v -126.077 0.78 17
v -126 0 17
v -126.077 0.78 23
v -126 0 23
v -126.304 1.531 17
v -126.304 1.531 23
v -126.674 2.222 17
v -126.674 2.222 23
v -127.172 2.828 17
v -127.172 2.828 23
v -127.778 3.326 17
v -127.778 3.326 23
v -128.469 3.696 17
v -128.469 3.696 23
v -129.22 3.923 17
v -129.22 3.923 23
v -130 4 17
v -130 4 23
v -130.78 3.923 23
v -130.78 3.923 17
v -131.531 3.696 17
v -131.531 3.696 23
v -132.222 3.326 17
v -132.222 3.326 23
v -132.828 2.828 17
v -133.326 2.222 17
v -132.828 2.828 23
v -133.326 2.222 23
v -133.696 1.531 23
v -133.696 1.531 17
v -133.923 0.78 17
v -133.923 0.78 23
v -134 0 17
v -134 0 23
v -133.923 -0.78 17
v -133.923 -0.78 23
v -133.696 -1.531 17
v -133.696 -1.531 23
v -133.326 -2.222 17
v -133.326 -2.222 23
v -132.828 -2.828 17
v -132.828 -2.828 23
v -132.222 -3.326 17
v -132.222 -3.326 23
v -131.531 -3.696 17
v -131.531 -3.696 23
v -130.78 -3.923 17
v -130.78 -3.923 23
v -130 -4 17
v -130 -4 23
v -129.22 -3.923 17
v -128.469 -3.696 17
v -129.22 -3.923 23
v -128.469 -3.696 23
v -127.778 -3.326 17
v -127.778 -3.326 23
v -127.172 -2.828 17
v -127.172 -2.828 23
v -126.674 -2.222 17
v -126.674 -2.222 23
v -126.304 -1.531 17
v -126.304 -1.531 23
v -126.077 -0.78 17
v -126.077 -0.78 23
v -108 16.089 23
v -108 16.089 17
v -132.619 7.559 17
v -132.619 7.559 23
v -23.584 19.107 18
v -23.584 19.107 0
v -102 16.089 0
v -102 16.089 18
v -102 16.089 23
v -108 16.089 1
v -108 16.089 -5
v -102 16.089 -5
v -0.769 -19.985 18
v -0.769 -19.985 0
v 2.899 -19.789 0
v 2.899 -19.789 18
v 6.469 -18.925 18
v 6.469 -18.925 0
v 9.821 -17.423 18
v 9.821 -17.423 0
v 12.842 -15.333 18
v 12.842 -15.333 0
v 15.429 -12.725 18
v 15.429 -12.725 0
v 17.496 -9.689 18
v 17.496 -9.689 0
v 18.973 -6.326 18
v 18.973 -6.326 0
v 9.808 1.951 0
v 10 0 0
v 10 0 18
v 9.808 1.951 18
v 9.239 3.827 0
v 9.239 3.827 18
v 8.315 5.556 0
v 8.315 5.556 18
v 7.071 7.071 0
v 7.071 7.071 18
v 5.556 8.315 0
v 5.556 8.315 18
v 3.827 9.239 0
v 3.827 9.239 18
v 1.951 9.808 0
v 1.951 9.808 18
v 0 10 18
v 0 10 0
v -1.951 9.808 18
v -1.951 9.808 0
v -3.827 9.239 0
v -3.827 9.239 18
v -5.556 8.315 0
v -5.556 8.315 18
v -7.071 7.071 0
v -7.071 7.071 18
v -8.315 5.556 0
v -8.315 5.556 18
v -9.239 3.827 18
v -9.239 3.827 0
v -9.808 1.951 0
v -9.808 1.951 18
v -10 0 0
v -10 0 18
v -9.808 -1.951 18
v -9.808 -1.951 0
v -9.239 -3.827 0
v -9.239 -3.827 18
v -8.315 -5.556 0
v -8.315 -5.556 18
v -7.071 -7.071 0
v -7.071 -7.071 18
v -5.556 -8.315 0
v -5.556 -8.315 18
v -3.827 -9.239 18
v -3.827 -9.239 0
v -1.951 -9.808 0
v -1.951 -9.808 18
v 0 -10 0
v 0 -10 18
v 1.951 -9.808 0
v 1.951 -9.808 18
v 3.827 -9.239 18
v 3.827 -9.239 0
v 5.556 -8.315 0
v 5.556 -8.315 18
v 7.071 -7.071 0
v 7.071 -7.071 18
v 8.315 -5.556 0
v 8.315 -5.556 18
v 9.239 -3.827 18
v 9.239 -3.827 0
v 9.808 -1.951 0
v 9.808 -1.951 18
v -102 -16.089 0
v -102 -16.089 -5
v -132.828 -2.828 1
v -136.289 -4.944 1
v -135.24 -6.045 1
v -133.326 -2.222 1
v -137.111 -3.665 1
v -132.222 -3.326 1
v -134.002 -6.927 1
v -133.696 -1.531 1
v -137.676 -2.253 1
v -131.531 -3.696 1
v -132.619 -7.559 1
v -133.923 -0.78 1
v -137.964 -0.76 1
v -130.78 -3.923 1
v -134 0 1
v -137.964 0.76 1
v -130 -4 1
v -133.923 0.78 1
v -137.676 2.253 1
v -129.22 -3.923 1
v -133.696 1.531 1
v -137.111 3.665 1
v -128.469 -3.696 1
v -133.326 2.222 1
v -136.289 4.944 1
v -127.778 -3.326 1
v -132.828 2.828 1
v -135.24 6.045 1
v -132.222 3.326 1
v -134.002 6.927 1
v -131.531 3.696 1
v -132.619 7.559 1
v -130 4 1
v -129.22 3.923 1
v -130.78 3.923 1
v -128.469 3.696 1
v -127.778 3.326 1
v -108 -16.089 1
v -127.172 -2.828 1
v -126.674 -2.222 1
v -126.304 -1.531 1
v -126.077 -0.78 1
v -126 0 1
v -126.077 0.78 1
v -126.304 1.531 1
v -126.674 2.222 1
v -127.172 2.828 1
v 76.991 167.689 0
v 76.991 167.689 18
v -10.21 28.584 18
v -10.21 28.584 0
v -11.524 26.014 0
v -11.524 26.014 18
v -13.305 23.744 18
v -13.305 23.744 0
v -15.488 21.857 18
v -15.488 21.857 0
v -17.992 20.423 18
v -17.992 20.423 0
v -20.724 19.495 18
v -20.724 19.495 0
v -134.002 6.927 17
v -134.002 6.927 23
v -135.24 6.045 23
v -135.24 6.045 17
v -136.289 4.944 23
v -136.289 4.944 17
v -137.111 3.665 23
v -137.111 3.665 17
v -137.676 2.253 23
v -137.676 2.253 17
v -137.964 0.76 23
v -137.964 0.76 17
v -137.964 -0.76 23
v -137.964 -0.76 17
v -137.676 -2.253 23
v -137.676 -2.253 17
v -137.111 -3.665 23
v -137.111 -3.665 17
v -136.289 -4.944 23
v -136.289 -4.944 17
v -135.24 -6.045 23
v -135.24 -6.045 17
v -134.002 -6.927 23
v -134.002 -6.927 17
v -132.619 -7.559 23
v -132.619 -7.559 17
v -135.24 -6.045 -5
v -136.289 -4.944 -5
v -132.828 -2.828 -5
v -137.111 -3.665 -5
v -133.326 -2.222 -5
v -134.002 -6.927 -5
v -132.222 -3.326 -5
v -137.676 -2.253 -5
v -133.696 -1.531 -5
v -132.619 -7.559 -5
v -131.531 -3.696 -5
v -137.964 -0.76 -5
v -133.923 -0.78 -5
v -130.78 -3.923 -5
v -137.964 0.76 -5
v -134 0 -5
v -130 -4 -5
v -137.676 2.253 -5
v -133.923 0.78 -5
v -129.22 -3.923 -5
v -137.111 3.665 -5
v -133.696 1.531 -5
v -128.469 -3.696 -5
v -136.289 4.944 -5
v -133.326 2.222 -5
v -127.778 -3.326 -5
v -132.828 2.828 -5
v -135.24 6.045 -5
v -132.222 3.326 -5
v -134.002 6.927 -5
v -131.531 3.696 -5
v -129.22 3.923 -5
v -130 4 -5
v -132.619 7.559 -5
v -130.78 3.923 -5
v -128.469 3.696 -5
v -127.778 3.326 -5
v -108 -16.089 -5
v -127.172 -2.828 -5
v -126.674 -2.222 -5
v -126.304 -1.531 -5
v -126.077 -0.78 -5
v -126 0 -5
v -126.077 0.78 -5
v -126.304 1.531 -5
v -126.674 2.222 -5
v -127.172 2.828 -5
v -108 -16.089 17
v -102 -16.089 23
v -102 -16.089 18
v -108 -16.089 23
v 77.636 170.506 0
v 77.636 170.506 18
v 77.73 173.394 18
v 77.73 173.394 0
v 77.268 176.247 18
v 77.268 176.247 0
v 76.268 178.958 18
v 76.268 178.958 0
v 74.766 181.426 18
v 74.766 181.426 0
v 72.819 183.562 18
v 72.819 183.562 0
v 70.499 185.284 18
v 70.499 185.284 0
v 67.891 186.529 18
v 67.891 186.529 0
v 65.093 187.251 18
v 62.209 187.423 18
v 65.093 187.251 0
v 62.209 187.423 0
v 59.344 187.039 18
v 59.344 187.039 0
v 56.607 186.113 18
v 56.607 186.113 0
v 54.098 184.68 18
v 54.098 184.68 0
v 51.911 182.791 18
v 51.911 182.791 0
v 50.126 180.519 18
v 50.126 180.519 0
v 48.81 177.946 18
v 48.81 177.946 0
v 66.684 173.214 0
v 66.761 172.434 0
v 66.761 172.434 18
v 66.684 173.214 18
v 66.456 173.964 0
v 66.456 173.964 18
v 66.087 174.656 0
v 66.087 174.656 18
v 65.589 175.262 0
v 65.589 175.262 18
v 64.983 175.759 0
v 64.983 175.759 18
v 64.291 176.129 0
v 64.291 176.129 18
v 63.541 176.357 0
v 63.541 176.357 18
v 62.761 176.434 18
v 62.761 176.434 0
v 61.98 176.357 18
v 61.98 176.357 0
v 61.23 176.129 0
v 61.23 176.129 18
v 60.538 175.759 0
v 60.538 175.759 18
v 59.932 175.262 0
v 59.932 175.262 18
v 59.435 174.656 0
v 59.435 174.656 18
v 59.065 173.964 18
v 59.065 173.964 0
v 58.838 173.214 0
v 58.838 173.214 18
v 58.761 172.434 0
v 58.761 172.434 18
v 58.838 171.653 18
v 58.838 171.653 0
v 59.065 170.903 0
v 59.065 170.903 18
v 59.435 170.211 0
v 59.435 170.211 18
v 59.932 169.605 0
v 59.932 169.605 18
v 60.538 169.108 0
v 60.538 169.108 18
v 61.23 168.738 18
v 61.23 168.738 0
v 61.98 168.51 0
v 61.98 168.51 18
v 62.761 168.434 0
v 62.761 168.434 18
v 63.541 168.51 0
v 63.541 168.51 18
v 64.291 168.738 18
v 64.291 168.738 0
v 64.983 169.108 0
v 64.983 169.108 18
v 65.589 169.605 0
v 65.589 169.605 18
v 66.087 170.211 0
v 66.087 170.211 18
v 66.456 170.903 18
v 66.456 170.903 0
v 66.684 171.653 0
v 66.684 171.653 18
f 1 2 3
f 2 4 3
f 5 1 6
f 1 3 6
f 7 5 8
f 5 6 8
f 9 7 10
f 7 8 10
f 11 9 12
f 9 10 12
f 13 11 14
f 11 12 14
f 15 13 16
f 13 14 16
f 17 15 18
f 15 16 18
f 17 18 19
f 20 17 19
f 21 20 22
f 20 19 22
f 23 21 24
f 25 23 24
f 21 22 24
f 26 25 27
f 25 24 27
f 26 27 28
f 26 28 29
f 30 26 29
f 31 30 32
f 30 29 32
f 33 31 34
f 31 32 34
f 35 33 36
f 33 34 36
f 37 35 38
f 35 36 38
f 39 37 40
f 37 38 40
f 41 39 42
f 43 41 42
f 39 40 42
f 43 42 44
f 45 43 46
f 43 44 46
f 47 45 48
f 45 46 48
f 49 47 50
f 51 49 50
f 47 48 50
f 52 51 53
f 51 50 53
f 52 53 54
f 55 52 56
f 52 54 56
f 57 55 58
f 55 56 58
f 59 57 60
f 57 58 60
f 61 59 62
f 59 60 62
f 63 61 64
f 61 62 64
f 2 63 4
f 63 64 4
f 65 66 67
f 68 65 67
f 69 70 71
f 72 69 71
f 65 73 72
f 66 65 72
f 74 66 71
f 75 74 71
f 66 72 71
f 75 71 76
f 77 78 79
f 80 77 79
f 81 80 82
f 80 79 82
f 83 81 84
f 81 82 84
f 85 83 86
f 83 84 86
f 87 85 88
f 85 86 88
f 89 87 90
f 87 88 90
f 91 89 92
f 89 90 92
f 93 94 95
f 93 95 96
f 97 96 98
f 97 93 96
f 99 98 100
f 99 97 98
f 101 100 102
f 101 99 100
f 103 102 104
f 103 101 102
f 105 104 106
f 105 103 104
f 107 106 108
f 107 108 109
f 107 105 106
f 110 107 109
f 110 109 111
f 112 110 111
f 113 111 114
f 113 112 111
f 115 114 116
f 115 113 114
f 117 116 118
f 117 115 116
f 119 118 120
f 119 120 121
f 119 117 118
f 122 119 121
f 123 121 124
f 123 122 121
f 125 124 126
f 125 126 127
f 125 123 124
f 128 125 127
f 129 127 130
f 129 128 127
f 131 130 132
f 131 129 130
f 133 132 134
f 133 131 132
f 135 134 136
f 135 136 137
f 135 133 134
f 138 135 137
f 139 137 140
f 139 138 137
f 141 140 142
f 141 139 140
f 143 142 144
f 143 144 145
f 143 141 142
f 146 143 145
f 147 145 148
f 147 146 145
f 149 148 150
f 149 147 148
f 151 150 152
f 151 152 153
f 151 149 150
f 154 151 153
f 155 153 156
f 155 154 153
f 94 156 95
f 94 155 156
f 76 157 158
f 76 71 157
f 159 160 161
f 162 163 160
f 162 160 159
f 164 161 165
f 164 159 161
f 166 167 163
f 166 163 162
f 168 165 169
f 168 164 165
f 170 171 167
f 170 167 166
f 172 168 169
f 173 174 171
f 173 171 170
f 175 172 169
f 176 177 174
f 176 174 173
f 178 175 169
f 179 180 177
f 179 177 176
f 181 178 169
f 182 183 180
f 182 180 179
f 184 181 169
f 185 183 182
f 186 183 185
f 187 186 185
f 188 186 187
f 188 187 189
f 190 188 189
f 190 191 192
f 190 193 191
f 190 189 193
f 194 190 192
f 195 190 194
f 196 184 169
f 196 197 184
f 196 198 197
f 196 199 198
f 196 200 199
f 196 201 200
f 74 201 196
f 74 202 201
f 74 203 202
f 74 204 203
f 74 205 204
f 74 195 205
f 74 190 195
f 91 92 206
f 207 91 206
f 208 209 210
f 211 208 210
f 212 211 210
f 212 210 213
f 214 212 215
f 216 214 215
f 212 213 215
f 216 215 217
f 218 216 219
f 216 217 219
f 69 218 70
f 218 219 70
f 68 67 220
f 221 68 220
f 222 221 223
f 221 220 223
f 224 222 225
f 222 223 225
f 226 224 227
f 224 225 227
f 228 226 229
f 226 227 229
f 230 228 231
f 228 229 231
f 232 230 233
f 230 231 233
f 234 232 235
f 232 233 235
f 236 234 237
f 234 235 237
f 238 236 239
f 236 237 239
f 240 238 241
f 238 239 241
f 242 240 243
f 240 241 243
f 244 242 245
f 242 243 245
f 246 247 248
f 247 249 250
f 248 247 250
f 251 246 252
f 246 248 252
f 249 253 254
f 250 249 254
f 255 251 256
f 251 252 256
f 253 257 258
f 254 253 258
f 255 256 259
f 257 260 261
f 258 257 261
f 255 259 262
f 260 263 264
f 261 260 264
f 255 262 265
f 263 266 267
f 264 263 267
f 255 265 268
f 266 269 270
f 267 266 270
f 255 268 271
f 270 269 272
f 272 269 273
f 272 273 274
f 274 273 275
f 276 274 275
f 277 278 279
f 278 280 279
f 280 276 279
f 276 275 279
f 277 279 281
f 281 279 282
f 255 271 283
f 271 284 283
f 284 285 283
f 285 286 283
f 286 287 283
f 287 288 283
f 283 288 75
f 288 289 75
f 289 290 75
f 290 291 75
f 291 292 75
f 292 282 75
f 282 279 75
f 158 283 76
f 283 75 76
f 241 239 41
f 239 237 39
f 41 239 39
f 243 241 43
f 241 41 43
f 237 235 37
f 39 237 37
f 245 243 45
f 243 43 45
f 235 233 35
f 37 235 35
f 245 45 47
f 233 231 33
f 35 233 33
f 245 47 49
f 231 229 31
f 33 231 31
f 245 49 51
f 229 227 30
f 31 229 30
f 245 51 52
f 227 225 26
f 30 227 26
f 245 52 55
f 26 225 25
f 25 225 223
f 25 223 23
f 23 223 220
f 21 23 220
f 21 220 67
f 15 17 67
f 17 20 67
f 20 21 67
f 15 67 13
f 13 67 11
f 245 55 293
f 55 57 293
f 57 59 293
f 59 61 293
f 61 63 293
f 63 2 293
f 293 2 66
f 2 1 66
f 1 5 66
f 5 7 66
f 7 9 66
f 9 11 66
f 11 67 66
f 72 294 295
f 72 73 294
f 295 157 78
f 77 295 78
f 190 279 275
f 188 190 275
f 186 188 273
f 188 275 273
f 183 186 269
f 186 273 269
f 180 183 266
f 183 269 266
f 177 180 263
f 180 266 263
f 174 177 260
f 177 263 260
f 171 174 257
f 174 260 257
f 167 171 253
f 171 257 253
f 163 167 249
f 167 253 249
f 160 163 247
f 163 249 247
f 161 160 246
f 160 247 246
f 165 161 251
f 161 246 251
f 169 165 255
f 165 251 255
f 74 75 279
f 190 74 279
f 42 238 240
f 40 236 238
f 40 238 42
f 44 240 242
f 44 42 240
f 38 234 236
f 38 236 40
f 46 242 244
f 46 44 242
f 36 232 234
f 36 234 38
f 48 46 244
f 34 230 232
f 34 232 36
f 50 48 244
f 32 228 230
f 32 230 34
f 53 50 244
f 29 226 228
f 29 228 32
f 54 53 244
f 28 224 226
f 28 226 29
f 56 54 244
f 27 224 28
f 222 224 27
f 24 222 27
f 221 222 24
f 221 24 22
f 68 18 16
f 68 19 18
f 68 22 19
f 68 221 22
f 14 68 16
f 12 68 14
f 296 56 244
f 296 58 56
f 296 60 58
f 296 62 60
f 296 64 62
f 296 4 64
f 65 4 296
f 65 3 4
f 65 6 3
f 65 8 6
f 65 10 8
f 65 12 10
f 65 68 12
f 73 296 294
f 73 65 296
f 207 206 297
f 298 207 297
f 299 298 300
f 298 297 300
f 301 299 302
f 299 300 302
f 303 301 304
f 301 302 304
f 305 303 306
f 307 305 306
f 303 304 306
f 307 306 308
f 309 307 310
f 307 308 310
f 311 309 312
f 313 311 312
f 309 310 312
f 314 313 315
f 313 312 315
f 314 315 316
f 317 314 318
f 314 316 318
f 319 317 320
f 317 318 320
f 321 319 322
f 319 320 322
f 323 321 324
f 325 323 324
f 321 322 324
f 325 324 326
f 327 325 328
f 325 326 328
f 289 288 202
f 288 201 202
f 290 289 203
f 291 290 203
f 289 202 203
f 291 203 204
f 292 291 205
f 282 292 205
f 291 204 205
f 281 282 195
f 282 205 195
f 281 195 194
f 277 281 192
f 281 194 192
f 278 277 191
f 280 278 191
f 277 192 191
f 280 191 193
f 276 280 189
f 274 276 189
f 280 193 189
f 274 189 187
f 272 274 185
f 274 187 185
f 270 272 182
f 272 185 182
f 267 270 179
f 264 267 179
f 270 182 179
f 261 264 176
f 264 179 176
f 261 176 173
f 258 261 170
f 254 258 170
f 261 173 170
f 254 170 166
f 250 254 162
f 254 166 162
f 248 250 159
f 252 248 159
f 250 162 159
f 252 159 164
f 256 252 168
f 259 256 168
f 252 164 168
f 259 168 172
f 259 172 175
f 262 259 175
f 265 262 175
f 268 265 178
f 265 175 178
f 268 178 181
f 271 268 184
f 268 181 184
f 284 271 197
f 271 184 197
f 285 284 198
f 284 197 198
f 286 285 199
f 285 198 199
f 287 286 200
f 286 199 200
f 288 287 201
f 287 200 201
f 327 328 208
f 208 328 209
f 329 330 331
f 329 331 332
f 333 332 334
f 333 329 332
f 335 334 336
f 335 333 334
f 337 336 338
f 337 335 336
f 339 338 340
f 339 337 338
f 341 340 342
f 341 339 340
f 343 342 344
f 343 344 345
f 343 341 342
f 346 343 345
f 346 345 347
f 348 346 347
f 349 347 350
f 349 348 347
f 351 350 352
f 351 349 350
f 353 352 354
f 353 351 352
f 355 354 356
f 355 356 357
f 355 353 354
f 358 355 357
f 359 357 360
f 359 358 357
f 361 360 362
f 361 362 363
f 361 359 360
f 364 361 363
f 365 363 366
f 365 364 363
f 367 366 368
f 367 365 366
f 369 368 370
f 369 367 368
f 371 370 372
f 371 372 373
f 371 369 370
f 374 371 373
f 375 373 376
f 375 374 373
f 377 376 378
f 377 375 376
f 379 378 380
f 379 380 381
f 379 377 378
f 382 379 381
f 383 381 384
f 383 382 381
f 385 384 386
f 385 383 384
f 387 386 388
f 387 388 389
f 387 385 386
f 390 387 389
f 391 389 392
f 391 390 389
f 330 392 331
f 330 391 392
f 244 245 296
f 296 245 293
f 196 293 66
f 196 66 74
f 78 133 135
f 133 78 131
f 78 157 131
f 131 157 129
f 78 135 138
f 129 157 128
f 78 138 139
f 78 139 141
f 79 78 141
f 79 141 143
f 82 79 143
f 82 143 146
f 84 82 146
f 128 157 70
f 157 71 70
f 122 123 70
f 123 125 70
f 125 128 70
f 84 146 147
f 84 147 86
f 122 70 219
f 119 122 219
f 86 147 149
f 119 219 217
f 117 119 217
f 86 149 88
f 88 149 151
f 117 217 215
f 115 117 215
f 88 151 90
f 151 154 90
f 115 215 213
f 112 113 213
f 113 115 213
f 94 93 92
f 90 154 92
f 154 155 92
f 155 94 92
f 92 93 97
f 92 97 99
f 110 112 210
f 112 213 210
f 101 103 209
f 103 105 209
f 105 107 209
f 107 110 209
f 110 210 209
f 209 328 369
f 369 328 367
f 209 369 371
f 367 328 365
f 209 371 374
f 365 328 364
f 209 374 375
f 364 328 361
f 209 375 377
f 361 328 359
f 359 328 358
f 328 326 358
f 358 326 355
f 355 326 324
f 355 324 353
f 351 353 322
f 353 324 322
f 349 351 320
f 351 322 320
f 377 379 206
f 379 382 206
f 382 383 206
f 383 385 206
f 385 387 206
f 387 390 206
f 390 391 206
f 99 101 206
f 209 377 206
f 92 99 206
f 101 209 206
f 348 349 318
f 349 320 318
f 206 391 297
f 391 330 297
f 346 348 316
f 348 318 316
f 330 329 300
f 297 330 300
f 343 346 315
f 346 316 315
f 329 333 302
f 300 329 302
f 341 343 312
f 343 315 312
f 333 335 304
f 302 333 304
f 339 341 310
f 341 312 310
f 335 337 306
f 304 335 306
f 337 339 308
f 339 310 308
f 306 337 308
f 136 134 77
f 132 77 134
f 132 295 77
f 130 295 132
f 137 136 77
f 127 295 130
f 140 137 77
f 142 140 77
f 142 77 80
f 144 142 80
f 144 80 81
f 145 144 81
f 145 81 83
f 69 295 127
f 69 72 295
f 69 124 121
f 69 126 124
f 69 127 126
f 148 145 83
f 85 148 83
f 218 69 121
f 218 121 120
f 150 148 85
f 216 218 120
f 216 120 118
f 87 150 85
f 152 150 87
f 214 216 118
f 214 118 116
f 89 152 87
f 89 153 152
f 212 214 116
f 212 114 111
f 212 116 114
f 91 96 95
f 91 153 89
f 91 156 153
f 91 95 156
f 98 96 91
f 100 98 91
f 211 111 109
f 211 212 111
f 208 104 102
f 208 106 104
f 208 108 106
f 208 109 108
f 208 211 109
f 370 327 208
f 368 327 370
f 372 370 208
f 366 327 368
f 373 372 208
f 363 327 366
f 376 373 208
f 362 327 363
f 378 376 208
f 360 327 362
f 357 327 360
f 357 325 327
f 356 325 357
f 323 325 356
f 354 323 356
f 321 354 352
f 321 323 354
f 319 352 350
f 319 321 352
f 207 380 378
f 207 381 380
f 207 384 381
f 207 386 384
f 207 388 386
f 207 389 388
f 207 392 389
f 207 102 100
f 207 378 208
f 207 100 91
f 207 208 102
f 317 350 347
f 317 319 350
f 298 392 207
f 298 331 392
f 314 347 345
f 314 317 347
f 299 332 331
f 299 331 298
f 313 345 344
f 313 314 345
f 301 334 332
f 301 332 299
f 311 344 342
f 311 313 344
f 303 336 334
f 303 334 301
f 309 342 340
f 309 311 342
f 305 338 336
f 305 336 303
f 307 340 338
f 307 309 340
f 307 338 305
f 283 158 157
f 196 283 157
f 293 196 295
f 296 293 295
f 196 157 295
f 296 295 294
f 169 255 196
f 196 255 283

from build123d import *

# Parameters (mm, degrees)
EXTRUDE_1_DEPTH     = 18
SKETCH_2_R          = 4
SKETCH_2_R_2        = 10
CUT_EXTRUDE_1_DEPTH = 18
SKETCH_4_W          = 33.000030669
SKETCH_4_H          = 62.878436815
CUT_EXTRUDE_2_DEPTH = 60
EXTRUDE_2_DEPTH     = 6
EXTRUDE_START       = -5
EXTRUDE_3_DEPTH     = 6
EXTRUDE_START_2     = 17
EXTRUDE_4_DEPTH     = 6
SKETCH_7_R          = 4
CUT_EXTRUDE_3_DEPTH = 30


with BuildPart() as part:
    # 草图1 → 凸台-拉伸1 (new body)
    with BuildSketch(Plane.XY):
        with BuildLine():
            Line((48.810330778, 177.946063765), (-10.210076964, 28.583512616))
            ThreePointArc((-10.210076964, 28.583512616), (-15.488001892, 21.85715805), (-23.583519409, 19.107079247))
            Line((-23.583519409, 19.107079247), (-130.576923077, 14.988901219))
            ThreePointArc((-130.576923077, 14.988901219), (-145, 0), (-130.576923077, -14.988901219))
            Line((-130.576923077, -14.988901219), (-0.769230769, -19.985201626))
            ThreePointArc((-0.769230769, -19.985201626), (11.379442316, -16.447136303), (18.973261361, -6.325768991))
            Line((18.973261361, -6.325768991), (76.990642321, 167.689269171))
            ThreePointArc((76.990642321, 167.689269171), (67.89099845, 186.528985226), (48.810330778, 177.946063765))
        make_face()
    extrude(amount=EXTRUDE_1_DEPTH)

    # 草图2 → 切除-拉伸1 (cut)
    with BuildSketch(Plane.XY):
        with Locations((62.7606963, 172.433595914)):
            Circle(SKETCH_2_R)
        Circle(SKETCH_2_R_2)
    extrude(amount=CUT_EXTRUDE_1_DEPTH, mode=Mode.SUBTRACT)

    # 草图4 → 切除-拉伸2 (cut)
    with BuildSketch(Plane.ZY.offset(102)):
        with Locations((8.194839776, -6.074779021)):
            Rectangle(SKETCH_4_W, SKETCH_4_H)
    extrude(amount=CUT_EXTRUDE_2_DEPTH, mode=Mode.SUBTRACT)

    # 草图5 → 凸台-拉伸2 (add)
    with BuildSketch(Plane.ZY.offset(102)):
        Polygon((9, -16.088827501), (-5, -16.088827501), (-5, 16.088827501), (9, 16.088827501), (23, 16.088827501), (23, -16.088827501), align=None)
    extrude(amount=EXTRUDE_2_DEPTH)

    # 草图6 → 凸台-拉伸3 (add)
    with BuildSketch(Plane.XY.offset(EXTRUDE_START)):
        with BuildLine():
            Line((-108, 16.088827501), (-132.619002915, 7.559282635))
            ThreePointArc((-132.619002915, 7.559282635), (-138.000120638, 0), (-132.619002915, -7.559282635))
            Line((-132.619002915, -7.559282635), (-108, -16.088827501))
            Line((-108, -16.088827501), (-108, 16.088827501))
        make_face()
    extrude(amount=EXTRUDE_3_DEPTH)

    # 草图6<2> → 凸台-拉伸4 (add)
    with BuildSketch(Plane.XY.offset(EXTRUDE_START_2)):
        with BuildLine():
            Line((-108, 16.088827501), (-132.619002915, 7.559282635))
            ThreePointArc((-132.619002915, 7.559282635), (-138.000120638, 0), (-132.619002915, -7.559282635))
            Line((-132.619002915, -7.559282635), (-108, -16.088827501))
            Line((-108, -16.088827501), (-108, 16.088827501))
        make_face()
    extrude(amount=EXTRUDE_4_DEPTH)

    # 草图7 → 切除-拉伸3 (cut, symmetric)
    with BuildSketch(Plane.XY):
        with Locations((-130, 0)):
            Circle(SKETCH_7_R)
    extrude(amount=CUT_EXTRUDE_3_DEPTH, both=True, mode=Mode.SUBTRACT)


solid = part.part
